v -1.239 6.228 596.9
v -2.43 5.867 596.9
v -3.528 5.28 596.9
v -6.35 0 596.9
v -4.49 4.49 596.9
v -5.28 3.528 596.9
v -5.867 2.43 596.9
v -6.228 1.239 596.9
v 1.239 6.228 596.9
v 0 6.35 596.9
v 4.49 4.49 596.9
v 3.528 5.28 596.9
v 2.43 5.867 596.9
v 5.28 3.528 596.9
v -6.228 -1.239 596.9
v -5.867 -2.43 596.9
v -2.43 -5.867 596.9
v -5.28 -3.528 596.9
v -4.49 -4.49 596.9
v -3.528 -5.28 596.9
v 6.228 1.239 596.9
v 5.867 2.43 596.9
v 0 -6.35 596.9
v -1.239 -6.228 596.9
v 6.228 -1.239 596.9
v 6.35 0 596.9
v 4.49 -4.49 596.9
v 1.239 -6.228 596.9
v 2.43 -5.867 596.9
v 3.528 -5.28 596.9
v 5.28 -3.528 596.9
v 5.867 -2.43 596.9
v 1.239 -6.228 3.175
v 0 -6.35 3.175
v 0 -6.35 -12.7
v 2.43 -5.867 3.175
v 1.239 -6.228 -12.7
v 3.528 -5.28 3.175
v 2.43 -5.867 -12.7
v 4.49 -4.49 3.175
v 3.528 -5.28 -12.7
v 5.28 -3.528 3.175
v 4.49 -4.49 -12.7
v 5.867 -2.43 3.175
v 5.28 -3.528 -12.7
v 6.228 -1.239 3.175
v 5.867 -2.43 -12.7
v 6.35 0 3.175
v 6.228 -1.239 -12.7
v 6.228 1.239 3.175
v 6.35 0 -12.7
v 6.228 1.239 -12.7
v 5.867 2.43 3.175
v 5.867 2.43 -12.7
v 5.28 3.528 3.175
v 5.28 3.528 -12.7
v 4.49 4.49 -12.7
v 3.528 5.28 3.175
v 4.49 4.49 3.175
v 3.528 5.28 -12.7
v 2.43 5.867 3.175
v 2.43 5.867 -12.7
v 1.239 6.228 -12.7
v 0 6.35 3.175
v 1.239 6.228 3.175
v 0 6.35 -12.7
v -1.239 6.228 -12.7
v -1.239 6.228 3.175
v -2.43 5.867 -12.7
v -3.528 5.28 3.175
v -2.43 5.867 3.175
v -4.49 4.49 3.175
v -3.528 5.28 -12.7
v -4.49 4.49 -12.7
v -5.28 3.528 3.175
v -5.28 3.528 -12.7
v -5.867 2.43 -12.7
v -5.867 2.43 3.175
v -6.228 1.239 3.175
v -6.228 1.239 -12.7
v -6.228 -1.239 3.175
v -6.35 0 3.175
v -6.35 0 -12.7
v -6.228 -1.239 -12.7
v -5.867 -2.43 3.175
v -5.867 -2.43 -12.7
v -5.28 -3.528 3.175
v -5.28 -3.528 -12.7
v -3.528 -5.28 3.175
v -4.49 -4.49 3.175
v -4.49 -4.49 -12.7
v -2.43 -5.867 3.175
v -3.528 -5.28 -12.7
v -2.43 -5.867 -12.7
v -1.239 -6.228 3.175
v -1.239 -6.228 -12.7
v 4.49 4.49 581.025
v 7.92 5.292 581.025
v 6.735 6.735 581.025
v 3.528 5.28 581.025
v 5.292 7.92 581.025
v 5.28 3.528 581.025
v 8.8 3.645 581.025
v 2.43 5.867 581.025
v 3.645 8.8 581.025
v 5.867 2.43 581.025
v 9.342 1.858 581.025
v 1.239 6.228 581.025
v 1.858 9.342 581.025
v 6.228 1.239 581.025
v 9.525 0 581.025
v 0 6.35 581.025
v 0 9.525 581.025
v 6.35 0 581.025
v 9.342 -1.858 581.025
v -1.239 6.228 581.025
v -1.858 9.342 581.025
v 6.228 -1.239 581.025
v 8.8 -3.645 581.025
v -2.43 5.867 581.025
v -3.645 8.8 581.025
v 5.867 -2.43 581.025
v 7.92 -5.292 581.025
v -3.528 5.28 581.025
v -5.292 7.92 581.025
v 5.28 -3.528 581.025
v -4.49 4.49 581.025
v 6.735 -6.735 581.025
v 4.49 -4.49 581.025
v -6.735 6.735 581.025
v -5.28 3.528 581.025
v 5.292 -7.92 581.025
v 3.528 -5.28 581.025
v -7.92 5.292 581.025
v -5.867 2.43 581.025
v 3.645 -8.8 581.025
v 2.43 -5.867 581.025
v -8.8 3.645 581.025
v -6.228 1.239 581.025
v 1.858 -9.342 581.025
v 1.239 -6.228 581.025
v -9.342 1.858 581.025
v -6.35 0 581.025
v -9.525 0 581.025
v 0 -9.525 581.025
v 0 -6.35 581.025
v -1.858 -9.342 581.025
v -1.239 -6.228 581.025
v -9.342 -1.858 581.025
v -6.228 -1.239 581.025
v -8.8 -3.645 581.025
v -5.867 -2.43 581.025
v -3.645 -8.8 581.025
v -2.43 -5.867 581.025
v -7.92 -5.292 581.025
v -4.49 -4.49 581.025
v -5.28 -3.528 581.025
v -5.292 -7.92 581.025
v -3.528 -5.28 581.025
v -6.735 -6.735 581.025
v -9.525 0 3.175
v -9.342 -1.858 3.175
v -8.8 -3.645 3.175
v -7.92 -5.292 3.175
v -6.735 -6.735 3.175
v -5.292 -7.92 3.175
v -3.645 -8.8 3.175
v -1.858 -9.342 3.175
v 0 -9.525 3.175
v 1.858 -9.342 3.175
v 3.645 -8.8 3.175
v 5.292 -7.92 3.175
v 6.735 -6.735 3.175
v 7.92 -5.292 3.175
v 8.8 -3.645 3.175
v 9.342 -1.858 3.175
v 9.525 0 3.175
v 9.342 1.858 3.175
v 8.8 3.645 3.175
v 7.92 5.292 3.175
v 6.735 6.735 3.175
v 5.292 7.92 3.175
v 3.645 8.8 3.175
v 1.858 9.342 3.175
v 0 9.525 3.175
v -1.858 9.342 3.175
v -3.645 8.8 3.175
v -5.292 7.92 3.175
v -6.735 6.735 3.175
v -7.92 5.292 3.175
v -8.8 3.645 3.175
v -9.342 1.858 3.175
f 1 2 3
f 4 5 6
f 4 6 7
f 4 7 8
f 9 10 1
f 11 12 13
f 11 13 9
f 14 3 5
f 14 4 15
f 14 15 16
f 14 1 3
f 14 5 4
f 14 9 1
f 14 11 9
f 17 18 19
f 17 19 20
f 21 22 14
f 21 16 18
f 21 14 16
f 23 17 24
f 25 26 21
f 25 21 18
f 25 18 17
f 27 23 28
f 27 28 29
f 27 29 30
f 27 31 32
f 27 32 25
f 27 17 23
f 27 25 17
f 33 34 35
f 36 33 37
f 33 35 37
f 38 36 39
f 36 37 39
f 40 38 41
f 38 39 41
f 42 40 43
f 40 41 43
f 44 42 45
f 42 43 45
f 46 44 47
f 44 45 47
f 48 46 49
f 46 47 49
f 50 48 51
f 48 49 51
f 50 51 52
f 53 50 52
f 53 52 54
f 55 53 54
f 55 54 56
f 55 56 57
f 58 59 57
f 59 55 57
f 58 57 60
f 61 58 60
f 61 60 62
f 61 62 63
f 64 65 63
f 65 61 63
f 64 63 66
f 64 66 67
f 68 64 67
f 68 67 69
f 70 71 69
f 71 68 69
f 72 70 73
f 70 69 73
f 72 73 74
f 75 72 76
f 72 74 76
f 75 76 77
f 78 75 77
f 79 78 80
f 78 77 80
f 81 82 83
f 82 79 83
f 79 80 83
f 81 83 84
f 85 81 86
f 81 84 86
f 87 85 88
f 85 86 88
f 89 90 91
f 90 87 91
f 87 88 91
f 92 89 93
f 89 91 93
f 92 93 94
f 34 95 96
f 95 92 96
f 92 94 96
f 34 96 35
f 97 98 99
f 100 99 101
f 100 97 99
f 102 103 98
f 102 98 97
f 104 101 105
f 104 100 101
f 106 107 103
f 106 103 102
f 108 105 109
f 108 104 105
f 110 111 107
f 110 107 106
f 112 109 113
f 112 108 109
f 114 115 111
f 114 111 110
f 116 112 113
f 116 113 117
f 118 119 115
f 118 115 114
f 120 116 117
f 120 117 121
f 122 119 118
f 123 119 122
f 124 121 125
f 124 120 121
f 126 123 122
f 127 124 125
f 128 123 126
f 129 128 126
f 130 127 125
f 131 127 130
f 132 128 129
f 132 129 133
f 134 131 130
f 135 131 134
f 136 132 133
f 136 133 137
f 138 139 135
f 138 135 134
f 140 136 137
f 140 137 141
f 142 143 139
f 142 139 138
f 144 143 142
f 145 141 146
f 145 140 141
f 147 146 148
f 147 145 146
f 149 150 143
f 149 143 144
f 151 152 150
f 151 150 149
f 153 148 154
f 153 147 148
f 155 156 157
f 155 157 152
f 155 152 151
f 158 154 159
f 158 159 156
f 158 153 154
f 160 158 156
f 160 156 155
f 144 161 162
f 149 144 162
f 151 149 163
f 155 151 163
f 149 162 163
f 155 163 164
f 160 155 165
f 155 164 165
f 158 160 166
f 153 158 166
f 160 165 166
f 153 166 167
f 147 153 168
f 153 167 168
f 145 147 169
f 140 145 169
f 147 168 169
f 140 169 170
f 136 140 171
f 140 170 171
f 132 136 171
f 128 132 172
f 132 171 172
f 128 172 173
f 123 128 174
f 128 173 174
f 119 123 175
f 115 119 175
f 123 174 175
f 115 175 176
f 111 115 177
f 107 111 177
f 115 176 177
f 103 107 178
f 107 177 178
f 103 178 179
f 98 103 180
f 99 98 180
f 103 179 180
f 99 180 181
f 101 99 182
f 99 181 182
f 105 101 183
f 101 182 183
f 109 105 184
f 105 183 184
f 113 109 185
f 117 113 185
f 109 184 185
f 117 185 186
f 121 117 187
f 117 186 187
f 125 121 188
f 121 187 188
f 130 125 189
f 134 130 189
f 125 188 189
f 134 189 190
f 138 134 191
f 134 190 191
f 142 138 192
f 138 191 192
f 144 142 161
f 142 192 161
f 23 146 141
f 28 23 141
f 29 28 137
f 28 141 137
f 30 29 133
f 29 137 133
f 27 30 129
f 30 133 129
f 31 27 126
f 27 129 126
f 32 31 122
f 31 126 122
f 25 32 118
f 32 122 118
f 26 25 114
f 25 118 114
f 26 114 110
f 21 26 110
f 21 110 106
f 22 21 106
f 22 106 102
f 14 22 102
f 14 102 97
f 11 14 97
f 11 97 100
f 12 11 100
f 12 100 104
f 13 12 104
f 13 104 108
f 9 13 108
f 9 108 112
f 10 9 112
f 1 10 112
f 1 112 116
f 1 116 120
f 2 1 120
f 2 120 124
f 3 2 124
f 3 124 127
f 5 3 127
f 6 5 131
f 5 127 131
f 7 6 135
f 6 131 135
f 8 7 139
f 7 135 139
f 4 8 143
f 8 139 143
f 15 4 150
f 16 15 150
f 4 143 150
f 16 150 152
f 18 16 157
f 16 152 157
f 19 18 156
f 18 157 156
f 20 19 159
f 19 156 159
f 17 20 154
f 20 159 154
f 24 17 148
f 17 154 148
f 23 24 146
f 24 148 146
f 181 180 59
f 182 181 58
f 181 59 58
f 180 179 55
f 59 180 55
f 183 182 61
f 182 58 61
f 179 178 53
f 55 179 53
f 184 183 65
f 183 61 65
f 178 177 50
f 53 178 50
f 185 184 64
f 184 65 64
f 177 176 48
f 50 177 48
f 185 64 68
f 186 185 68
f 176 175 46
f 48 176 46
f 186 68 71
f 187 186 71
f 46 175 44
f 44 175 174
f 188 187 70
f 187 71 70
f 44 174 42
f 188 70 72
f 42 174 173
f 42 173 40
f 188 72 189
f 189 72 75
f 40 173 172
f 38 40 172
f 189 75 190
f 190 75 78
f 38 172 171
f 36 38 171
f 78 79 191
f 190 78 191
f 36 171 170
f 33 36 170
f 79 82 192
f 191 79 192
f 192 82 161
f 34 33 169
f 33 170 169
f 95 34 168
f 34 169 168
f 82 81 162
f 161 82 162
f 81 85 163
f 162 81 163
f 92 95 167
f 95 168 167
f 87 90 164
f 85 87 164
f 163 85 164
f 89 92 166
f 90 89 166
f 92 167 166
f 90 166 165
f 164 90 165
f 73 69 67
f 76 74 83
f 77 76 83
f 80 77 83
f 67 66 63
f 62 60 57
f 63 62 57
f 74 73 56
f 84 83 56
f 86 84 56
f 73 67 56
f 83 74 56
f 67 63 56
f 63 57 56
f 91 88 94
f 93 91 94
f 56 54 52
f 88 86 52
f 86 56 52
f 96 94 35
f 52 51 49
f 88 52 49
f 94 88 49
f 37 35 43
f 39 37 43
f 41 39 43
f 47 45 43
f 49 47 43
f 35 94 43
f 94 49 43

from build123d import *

# Parameters (mm, degrees)
BOSS_EXTRUDE3_DEPTH      = 596.9
BOSS_EXTRUDE3_DEPTH_BACK = 12.7
SKETCH1_R                = 6.35
BOSS_EXTRUDE4_START      = 3.175
SKETCH3_R                = 9.525
BOSS_EXTRUDE4_DEPTH      = 577.85


with BuildPart() as part:
    # Sketch1 → Boss-Extrude3 (new, two sides: drawn at the far end of the back side and taken through both)
    with BuildSketch(Plane.XY.offset(-BOSS_EXTRUDE3_DEPTH_BACK)):
        with Locations(Location((0, 0, 0), (0, 0, 270))):
            Circle(SKETCH1_R)
    extrude(amount=BOSS_EXTRUDE3_DEPTH + BOSS_EXTRUDE3_DEPTH_BACK)

    # Sketch3 → Boss-Extrude4 (add)
    with BuildSketch(Plane.XY.offset(BOSS_EXTRUDE4_START)):
        with Locations(Location((0, 0, 0), (0, 0, 180))):
            Circle(SKETCH3_R)
    extrude(amount=BOSS_EXTRUDE4_DEPTH)


solid = part.part
